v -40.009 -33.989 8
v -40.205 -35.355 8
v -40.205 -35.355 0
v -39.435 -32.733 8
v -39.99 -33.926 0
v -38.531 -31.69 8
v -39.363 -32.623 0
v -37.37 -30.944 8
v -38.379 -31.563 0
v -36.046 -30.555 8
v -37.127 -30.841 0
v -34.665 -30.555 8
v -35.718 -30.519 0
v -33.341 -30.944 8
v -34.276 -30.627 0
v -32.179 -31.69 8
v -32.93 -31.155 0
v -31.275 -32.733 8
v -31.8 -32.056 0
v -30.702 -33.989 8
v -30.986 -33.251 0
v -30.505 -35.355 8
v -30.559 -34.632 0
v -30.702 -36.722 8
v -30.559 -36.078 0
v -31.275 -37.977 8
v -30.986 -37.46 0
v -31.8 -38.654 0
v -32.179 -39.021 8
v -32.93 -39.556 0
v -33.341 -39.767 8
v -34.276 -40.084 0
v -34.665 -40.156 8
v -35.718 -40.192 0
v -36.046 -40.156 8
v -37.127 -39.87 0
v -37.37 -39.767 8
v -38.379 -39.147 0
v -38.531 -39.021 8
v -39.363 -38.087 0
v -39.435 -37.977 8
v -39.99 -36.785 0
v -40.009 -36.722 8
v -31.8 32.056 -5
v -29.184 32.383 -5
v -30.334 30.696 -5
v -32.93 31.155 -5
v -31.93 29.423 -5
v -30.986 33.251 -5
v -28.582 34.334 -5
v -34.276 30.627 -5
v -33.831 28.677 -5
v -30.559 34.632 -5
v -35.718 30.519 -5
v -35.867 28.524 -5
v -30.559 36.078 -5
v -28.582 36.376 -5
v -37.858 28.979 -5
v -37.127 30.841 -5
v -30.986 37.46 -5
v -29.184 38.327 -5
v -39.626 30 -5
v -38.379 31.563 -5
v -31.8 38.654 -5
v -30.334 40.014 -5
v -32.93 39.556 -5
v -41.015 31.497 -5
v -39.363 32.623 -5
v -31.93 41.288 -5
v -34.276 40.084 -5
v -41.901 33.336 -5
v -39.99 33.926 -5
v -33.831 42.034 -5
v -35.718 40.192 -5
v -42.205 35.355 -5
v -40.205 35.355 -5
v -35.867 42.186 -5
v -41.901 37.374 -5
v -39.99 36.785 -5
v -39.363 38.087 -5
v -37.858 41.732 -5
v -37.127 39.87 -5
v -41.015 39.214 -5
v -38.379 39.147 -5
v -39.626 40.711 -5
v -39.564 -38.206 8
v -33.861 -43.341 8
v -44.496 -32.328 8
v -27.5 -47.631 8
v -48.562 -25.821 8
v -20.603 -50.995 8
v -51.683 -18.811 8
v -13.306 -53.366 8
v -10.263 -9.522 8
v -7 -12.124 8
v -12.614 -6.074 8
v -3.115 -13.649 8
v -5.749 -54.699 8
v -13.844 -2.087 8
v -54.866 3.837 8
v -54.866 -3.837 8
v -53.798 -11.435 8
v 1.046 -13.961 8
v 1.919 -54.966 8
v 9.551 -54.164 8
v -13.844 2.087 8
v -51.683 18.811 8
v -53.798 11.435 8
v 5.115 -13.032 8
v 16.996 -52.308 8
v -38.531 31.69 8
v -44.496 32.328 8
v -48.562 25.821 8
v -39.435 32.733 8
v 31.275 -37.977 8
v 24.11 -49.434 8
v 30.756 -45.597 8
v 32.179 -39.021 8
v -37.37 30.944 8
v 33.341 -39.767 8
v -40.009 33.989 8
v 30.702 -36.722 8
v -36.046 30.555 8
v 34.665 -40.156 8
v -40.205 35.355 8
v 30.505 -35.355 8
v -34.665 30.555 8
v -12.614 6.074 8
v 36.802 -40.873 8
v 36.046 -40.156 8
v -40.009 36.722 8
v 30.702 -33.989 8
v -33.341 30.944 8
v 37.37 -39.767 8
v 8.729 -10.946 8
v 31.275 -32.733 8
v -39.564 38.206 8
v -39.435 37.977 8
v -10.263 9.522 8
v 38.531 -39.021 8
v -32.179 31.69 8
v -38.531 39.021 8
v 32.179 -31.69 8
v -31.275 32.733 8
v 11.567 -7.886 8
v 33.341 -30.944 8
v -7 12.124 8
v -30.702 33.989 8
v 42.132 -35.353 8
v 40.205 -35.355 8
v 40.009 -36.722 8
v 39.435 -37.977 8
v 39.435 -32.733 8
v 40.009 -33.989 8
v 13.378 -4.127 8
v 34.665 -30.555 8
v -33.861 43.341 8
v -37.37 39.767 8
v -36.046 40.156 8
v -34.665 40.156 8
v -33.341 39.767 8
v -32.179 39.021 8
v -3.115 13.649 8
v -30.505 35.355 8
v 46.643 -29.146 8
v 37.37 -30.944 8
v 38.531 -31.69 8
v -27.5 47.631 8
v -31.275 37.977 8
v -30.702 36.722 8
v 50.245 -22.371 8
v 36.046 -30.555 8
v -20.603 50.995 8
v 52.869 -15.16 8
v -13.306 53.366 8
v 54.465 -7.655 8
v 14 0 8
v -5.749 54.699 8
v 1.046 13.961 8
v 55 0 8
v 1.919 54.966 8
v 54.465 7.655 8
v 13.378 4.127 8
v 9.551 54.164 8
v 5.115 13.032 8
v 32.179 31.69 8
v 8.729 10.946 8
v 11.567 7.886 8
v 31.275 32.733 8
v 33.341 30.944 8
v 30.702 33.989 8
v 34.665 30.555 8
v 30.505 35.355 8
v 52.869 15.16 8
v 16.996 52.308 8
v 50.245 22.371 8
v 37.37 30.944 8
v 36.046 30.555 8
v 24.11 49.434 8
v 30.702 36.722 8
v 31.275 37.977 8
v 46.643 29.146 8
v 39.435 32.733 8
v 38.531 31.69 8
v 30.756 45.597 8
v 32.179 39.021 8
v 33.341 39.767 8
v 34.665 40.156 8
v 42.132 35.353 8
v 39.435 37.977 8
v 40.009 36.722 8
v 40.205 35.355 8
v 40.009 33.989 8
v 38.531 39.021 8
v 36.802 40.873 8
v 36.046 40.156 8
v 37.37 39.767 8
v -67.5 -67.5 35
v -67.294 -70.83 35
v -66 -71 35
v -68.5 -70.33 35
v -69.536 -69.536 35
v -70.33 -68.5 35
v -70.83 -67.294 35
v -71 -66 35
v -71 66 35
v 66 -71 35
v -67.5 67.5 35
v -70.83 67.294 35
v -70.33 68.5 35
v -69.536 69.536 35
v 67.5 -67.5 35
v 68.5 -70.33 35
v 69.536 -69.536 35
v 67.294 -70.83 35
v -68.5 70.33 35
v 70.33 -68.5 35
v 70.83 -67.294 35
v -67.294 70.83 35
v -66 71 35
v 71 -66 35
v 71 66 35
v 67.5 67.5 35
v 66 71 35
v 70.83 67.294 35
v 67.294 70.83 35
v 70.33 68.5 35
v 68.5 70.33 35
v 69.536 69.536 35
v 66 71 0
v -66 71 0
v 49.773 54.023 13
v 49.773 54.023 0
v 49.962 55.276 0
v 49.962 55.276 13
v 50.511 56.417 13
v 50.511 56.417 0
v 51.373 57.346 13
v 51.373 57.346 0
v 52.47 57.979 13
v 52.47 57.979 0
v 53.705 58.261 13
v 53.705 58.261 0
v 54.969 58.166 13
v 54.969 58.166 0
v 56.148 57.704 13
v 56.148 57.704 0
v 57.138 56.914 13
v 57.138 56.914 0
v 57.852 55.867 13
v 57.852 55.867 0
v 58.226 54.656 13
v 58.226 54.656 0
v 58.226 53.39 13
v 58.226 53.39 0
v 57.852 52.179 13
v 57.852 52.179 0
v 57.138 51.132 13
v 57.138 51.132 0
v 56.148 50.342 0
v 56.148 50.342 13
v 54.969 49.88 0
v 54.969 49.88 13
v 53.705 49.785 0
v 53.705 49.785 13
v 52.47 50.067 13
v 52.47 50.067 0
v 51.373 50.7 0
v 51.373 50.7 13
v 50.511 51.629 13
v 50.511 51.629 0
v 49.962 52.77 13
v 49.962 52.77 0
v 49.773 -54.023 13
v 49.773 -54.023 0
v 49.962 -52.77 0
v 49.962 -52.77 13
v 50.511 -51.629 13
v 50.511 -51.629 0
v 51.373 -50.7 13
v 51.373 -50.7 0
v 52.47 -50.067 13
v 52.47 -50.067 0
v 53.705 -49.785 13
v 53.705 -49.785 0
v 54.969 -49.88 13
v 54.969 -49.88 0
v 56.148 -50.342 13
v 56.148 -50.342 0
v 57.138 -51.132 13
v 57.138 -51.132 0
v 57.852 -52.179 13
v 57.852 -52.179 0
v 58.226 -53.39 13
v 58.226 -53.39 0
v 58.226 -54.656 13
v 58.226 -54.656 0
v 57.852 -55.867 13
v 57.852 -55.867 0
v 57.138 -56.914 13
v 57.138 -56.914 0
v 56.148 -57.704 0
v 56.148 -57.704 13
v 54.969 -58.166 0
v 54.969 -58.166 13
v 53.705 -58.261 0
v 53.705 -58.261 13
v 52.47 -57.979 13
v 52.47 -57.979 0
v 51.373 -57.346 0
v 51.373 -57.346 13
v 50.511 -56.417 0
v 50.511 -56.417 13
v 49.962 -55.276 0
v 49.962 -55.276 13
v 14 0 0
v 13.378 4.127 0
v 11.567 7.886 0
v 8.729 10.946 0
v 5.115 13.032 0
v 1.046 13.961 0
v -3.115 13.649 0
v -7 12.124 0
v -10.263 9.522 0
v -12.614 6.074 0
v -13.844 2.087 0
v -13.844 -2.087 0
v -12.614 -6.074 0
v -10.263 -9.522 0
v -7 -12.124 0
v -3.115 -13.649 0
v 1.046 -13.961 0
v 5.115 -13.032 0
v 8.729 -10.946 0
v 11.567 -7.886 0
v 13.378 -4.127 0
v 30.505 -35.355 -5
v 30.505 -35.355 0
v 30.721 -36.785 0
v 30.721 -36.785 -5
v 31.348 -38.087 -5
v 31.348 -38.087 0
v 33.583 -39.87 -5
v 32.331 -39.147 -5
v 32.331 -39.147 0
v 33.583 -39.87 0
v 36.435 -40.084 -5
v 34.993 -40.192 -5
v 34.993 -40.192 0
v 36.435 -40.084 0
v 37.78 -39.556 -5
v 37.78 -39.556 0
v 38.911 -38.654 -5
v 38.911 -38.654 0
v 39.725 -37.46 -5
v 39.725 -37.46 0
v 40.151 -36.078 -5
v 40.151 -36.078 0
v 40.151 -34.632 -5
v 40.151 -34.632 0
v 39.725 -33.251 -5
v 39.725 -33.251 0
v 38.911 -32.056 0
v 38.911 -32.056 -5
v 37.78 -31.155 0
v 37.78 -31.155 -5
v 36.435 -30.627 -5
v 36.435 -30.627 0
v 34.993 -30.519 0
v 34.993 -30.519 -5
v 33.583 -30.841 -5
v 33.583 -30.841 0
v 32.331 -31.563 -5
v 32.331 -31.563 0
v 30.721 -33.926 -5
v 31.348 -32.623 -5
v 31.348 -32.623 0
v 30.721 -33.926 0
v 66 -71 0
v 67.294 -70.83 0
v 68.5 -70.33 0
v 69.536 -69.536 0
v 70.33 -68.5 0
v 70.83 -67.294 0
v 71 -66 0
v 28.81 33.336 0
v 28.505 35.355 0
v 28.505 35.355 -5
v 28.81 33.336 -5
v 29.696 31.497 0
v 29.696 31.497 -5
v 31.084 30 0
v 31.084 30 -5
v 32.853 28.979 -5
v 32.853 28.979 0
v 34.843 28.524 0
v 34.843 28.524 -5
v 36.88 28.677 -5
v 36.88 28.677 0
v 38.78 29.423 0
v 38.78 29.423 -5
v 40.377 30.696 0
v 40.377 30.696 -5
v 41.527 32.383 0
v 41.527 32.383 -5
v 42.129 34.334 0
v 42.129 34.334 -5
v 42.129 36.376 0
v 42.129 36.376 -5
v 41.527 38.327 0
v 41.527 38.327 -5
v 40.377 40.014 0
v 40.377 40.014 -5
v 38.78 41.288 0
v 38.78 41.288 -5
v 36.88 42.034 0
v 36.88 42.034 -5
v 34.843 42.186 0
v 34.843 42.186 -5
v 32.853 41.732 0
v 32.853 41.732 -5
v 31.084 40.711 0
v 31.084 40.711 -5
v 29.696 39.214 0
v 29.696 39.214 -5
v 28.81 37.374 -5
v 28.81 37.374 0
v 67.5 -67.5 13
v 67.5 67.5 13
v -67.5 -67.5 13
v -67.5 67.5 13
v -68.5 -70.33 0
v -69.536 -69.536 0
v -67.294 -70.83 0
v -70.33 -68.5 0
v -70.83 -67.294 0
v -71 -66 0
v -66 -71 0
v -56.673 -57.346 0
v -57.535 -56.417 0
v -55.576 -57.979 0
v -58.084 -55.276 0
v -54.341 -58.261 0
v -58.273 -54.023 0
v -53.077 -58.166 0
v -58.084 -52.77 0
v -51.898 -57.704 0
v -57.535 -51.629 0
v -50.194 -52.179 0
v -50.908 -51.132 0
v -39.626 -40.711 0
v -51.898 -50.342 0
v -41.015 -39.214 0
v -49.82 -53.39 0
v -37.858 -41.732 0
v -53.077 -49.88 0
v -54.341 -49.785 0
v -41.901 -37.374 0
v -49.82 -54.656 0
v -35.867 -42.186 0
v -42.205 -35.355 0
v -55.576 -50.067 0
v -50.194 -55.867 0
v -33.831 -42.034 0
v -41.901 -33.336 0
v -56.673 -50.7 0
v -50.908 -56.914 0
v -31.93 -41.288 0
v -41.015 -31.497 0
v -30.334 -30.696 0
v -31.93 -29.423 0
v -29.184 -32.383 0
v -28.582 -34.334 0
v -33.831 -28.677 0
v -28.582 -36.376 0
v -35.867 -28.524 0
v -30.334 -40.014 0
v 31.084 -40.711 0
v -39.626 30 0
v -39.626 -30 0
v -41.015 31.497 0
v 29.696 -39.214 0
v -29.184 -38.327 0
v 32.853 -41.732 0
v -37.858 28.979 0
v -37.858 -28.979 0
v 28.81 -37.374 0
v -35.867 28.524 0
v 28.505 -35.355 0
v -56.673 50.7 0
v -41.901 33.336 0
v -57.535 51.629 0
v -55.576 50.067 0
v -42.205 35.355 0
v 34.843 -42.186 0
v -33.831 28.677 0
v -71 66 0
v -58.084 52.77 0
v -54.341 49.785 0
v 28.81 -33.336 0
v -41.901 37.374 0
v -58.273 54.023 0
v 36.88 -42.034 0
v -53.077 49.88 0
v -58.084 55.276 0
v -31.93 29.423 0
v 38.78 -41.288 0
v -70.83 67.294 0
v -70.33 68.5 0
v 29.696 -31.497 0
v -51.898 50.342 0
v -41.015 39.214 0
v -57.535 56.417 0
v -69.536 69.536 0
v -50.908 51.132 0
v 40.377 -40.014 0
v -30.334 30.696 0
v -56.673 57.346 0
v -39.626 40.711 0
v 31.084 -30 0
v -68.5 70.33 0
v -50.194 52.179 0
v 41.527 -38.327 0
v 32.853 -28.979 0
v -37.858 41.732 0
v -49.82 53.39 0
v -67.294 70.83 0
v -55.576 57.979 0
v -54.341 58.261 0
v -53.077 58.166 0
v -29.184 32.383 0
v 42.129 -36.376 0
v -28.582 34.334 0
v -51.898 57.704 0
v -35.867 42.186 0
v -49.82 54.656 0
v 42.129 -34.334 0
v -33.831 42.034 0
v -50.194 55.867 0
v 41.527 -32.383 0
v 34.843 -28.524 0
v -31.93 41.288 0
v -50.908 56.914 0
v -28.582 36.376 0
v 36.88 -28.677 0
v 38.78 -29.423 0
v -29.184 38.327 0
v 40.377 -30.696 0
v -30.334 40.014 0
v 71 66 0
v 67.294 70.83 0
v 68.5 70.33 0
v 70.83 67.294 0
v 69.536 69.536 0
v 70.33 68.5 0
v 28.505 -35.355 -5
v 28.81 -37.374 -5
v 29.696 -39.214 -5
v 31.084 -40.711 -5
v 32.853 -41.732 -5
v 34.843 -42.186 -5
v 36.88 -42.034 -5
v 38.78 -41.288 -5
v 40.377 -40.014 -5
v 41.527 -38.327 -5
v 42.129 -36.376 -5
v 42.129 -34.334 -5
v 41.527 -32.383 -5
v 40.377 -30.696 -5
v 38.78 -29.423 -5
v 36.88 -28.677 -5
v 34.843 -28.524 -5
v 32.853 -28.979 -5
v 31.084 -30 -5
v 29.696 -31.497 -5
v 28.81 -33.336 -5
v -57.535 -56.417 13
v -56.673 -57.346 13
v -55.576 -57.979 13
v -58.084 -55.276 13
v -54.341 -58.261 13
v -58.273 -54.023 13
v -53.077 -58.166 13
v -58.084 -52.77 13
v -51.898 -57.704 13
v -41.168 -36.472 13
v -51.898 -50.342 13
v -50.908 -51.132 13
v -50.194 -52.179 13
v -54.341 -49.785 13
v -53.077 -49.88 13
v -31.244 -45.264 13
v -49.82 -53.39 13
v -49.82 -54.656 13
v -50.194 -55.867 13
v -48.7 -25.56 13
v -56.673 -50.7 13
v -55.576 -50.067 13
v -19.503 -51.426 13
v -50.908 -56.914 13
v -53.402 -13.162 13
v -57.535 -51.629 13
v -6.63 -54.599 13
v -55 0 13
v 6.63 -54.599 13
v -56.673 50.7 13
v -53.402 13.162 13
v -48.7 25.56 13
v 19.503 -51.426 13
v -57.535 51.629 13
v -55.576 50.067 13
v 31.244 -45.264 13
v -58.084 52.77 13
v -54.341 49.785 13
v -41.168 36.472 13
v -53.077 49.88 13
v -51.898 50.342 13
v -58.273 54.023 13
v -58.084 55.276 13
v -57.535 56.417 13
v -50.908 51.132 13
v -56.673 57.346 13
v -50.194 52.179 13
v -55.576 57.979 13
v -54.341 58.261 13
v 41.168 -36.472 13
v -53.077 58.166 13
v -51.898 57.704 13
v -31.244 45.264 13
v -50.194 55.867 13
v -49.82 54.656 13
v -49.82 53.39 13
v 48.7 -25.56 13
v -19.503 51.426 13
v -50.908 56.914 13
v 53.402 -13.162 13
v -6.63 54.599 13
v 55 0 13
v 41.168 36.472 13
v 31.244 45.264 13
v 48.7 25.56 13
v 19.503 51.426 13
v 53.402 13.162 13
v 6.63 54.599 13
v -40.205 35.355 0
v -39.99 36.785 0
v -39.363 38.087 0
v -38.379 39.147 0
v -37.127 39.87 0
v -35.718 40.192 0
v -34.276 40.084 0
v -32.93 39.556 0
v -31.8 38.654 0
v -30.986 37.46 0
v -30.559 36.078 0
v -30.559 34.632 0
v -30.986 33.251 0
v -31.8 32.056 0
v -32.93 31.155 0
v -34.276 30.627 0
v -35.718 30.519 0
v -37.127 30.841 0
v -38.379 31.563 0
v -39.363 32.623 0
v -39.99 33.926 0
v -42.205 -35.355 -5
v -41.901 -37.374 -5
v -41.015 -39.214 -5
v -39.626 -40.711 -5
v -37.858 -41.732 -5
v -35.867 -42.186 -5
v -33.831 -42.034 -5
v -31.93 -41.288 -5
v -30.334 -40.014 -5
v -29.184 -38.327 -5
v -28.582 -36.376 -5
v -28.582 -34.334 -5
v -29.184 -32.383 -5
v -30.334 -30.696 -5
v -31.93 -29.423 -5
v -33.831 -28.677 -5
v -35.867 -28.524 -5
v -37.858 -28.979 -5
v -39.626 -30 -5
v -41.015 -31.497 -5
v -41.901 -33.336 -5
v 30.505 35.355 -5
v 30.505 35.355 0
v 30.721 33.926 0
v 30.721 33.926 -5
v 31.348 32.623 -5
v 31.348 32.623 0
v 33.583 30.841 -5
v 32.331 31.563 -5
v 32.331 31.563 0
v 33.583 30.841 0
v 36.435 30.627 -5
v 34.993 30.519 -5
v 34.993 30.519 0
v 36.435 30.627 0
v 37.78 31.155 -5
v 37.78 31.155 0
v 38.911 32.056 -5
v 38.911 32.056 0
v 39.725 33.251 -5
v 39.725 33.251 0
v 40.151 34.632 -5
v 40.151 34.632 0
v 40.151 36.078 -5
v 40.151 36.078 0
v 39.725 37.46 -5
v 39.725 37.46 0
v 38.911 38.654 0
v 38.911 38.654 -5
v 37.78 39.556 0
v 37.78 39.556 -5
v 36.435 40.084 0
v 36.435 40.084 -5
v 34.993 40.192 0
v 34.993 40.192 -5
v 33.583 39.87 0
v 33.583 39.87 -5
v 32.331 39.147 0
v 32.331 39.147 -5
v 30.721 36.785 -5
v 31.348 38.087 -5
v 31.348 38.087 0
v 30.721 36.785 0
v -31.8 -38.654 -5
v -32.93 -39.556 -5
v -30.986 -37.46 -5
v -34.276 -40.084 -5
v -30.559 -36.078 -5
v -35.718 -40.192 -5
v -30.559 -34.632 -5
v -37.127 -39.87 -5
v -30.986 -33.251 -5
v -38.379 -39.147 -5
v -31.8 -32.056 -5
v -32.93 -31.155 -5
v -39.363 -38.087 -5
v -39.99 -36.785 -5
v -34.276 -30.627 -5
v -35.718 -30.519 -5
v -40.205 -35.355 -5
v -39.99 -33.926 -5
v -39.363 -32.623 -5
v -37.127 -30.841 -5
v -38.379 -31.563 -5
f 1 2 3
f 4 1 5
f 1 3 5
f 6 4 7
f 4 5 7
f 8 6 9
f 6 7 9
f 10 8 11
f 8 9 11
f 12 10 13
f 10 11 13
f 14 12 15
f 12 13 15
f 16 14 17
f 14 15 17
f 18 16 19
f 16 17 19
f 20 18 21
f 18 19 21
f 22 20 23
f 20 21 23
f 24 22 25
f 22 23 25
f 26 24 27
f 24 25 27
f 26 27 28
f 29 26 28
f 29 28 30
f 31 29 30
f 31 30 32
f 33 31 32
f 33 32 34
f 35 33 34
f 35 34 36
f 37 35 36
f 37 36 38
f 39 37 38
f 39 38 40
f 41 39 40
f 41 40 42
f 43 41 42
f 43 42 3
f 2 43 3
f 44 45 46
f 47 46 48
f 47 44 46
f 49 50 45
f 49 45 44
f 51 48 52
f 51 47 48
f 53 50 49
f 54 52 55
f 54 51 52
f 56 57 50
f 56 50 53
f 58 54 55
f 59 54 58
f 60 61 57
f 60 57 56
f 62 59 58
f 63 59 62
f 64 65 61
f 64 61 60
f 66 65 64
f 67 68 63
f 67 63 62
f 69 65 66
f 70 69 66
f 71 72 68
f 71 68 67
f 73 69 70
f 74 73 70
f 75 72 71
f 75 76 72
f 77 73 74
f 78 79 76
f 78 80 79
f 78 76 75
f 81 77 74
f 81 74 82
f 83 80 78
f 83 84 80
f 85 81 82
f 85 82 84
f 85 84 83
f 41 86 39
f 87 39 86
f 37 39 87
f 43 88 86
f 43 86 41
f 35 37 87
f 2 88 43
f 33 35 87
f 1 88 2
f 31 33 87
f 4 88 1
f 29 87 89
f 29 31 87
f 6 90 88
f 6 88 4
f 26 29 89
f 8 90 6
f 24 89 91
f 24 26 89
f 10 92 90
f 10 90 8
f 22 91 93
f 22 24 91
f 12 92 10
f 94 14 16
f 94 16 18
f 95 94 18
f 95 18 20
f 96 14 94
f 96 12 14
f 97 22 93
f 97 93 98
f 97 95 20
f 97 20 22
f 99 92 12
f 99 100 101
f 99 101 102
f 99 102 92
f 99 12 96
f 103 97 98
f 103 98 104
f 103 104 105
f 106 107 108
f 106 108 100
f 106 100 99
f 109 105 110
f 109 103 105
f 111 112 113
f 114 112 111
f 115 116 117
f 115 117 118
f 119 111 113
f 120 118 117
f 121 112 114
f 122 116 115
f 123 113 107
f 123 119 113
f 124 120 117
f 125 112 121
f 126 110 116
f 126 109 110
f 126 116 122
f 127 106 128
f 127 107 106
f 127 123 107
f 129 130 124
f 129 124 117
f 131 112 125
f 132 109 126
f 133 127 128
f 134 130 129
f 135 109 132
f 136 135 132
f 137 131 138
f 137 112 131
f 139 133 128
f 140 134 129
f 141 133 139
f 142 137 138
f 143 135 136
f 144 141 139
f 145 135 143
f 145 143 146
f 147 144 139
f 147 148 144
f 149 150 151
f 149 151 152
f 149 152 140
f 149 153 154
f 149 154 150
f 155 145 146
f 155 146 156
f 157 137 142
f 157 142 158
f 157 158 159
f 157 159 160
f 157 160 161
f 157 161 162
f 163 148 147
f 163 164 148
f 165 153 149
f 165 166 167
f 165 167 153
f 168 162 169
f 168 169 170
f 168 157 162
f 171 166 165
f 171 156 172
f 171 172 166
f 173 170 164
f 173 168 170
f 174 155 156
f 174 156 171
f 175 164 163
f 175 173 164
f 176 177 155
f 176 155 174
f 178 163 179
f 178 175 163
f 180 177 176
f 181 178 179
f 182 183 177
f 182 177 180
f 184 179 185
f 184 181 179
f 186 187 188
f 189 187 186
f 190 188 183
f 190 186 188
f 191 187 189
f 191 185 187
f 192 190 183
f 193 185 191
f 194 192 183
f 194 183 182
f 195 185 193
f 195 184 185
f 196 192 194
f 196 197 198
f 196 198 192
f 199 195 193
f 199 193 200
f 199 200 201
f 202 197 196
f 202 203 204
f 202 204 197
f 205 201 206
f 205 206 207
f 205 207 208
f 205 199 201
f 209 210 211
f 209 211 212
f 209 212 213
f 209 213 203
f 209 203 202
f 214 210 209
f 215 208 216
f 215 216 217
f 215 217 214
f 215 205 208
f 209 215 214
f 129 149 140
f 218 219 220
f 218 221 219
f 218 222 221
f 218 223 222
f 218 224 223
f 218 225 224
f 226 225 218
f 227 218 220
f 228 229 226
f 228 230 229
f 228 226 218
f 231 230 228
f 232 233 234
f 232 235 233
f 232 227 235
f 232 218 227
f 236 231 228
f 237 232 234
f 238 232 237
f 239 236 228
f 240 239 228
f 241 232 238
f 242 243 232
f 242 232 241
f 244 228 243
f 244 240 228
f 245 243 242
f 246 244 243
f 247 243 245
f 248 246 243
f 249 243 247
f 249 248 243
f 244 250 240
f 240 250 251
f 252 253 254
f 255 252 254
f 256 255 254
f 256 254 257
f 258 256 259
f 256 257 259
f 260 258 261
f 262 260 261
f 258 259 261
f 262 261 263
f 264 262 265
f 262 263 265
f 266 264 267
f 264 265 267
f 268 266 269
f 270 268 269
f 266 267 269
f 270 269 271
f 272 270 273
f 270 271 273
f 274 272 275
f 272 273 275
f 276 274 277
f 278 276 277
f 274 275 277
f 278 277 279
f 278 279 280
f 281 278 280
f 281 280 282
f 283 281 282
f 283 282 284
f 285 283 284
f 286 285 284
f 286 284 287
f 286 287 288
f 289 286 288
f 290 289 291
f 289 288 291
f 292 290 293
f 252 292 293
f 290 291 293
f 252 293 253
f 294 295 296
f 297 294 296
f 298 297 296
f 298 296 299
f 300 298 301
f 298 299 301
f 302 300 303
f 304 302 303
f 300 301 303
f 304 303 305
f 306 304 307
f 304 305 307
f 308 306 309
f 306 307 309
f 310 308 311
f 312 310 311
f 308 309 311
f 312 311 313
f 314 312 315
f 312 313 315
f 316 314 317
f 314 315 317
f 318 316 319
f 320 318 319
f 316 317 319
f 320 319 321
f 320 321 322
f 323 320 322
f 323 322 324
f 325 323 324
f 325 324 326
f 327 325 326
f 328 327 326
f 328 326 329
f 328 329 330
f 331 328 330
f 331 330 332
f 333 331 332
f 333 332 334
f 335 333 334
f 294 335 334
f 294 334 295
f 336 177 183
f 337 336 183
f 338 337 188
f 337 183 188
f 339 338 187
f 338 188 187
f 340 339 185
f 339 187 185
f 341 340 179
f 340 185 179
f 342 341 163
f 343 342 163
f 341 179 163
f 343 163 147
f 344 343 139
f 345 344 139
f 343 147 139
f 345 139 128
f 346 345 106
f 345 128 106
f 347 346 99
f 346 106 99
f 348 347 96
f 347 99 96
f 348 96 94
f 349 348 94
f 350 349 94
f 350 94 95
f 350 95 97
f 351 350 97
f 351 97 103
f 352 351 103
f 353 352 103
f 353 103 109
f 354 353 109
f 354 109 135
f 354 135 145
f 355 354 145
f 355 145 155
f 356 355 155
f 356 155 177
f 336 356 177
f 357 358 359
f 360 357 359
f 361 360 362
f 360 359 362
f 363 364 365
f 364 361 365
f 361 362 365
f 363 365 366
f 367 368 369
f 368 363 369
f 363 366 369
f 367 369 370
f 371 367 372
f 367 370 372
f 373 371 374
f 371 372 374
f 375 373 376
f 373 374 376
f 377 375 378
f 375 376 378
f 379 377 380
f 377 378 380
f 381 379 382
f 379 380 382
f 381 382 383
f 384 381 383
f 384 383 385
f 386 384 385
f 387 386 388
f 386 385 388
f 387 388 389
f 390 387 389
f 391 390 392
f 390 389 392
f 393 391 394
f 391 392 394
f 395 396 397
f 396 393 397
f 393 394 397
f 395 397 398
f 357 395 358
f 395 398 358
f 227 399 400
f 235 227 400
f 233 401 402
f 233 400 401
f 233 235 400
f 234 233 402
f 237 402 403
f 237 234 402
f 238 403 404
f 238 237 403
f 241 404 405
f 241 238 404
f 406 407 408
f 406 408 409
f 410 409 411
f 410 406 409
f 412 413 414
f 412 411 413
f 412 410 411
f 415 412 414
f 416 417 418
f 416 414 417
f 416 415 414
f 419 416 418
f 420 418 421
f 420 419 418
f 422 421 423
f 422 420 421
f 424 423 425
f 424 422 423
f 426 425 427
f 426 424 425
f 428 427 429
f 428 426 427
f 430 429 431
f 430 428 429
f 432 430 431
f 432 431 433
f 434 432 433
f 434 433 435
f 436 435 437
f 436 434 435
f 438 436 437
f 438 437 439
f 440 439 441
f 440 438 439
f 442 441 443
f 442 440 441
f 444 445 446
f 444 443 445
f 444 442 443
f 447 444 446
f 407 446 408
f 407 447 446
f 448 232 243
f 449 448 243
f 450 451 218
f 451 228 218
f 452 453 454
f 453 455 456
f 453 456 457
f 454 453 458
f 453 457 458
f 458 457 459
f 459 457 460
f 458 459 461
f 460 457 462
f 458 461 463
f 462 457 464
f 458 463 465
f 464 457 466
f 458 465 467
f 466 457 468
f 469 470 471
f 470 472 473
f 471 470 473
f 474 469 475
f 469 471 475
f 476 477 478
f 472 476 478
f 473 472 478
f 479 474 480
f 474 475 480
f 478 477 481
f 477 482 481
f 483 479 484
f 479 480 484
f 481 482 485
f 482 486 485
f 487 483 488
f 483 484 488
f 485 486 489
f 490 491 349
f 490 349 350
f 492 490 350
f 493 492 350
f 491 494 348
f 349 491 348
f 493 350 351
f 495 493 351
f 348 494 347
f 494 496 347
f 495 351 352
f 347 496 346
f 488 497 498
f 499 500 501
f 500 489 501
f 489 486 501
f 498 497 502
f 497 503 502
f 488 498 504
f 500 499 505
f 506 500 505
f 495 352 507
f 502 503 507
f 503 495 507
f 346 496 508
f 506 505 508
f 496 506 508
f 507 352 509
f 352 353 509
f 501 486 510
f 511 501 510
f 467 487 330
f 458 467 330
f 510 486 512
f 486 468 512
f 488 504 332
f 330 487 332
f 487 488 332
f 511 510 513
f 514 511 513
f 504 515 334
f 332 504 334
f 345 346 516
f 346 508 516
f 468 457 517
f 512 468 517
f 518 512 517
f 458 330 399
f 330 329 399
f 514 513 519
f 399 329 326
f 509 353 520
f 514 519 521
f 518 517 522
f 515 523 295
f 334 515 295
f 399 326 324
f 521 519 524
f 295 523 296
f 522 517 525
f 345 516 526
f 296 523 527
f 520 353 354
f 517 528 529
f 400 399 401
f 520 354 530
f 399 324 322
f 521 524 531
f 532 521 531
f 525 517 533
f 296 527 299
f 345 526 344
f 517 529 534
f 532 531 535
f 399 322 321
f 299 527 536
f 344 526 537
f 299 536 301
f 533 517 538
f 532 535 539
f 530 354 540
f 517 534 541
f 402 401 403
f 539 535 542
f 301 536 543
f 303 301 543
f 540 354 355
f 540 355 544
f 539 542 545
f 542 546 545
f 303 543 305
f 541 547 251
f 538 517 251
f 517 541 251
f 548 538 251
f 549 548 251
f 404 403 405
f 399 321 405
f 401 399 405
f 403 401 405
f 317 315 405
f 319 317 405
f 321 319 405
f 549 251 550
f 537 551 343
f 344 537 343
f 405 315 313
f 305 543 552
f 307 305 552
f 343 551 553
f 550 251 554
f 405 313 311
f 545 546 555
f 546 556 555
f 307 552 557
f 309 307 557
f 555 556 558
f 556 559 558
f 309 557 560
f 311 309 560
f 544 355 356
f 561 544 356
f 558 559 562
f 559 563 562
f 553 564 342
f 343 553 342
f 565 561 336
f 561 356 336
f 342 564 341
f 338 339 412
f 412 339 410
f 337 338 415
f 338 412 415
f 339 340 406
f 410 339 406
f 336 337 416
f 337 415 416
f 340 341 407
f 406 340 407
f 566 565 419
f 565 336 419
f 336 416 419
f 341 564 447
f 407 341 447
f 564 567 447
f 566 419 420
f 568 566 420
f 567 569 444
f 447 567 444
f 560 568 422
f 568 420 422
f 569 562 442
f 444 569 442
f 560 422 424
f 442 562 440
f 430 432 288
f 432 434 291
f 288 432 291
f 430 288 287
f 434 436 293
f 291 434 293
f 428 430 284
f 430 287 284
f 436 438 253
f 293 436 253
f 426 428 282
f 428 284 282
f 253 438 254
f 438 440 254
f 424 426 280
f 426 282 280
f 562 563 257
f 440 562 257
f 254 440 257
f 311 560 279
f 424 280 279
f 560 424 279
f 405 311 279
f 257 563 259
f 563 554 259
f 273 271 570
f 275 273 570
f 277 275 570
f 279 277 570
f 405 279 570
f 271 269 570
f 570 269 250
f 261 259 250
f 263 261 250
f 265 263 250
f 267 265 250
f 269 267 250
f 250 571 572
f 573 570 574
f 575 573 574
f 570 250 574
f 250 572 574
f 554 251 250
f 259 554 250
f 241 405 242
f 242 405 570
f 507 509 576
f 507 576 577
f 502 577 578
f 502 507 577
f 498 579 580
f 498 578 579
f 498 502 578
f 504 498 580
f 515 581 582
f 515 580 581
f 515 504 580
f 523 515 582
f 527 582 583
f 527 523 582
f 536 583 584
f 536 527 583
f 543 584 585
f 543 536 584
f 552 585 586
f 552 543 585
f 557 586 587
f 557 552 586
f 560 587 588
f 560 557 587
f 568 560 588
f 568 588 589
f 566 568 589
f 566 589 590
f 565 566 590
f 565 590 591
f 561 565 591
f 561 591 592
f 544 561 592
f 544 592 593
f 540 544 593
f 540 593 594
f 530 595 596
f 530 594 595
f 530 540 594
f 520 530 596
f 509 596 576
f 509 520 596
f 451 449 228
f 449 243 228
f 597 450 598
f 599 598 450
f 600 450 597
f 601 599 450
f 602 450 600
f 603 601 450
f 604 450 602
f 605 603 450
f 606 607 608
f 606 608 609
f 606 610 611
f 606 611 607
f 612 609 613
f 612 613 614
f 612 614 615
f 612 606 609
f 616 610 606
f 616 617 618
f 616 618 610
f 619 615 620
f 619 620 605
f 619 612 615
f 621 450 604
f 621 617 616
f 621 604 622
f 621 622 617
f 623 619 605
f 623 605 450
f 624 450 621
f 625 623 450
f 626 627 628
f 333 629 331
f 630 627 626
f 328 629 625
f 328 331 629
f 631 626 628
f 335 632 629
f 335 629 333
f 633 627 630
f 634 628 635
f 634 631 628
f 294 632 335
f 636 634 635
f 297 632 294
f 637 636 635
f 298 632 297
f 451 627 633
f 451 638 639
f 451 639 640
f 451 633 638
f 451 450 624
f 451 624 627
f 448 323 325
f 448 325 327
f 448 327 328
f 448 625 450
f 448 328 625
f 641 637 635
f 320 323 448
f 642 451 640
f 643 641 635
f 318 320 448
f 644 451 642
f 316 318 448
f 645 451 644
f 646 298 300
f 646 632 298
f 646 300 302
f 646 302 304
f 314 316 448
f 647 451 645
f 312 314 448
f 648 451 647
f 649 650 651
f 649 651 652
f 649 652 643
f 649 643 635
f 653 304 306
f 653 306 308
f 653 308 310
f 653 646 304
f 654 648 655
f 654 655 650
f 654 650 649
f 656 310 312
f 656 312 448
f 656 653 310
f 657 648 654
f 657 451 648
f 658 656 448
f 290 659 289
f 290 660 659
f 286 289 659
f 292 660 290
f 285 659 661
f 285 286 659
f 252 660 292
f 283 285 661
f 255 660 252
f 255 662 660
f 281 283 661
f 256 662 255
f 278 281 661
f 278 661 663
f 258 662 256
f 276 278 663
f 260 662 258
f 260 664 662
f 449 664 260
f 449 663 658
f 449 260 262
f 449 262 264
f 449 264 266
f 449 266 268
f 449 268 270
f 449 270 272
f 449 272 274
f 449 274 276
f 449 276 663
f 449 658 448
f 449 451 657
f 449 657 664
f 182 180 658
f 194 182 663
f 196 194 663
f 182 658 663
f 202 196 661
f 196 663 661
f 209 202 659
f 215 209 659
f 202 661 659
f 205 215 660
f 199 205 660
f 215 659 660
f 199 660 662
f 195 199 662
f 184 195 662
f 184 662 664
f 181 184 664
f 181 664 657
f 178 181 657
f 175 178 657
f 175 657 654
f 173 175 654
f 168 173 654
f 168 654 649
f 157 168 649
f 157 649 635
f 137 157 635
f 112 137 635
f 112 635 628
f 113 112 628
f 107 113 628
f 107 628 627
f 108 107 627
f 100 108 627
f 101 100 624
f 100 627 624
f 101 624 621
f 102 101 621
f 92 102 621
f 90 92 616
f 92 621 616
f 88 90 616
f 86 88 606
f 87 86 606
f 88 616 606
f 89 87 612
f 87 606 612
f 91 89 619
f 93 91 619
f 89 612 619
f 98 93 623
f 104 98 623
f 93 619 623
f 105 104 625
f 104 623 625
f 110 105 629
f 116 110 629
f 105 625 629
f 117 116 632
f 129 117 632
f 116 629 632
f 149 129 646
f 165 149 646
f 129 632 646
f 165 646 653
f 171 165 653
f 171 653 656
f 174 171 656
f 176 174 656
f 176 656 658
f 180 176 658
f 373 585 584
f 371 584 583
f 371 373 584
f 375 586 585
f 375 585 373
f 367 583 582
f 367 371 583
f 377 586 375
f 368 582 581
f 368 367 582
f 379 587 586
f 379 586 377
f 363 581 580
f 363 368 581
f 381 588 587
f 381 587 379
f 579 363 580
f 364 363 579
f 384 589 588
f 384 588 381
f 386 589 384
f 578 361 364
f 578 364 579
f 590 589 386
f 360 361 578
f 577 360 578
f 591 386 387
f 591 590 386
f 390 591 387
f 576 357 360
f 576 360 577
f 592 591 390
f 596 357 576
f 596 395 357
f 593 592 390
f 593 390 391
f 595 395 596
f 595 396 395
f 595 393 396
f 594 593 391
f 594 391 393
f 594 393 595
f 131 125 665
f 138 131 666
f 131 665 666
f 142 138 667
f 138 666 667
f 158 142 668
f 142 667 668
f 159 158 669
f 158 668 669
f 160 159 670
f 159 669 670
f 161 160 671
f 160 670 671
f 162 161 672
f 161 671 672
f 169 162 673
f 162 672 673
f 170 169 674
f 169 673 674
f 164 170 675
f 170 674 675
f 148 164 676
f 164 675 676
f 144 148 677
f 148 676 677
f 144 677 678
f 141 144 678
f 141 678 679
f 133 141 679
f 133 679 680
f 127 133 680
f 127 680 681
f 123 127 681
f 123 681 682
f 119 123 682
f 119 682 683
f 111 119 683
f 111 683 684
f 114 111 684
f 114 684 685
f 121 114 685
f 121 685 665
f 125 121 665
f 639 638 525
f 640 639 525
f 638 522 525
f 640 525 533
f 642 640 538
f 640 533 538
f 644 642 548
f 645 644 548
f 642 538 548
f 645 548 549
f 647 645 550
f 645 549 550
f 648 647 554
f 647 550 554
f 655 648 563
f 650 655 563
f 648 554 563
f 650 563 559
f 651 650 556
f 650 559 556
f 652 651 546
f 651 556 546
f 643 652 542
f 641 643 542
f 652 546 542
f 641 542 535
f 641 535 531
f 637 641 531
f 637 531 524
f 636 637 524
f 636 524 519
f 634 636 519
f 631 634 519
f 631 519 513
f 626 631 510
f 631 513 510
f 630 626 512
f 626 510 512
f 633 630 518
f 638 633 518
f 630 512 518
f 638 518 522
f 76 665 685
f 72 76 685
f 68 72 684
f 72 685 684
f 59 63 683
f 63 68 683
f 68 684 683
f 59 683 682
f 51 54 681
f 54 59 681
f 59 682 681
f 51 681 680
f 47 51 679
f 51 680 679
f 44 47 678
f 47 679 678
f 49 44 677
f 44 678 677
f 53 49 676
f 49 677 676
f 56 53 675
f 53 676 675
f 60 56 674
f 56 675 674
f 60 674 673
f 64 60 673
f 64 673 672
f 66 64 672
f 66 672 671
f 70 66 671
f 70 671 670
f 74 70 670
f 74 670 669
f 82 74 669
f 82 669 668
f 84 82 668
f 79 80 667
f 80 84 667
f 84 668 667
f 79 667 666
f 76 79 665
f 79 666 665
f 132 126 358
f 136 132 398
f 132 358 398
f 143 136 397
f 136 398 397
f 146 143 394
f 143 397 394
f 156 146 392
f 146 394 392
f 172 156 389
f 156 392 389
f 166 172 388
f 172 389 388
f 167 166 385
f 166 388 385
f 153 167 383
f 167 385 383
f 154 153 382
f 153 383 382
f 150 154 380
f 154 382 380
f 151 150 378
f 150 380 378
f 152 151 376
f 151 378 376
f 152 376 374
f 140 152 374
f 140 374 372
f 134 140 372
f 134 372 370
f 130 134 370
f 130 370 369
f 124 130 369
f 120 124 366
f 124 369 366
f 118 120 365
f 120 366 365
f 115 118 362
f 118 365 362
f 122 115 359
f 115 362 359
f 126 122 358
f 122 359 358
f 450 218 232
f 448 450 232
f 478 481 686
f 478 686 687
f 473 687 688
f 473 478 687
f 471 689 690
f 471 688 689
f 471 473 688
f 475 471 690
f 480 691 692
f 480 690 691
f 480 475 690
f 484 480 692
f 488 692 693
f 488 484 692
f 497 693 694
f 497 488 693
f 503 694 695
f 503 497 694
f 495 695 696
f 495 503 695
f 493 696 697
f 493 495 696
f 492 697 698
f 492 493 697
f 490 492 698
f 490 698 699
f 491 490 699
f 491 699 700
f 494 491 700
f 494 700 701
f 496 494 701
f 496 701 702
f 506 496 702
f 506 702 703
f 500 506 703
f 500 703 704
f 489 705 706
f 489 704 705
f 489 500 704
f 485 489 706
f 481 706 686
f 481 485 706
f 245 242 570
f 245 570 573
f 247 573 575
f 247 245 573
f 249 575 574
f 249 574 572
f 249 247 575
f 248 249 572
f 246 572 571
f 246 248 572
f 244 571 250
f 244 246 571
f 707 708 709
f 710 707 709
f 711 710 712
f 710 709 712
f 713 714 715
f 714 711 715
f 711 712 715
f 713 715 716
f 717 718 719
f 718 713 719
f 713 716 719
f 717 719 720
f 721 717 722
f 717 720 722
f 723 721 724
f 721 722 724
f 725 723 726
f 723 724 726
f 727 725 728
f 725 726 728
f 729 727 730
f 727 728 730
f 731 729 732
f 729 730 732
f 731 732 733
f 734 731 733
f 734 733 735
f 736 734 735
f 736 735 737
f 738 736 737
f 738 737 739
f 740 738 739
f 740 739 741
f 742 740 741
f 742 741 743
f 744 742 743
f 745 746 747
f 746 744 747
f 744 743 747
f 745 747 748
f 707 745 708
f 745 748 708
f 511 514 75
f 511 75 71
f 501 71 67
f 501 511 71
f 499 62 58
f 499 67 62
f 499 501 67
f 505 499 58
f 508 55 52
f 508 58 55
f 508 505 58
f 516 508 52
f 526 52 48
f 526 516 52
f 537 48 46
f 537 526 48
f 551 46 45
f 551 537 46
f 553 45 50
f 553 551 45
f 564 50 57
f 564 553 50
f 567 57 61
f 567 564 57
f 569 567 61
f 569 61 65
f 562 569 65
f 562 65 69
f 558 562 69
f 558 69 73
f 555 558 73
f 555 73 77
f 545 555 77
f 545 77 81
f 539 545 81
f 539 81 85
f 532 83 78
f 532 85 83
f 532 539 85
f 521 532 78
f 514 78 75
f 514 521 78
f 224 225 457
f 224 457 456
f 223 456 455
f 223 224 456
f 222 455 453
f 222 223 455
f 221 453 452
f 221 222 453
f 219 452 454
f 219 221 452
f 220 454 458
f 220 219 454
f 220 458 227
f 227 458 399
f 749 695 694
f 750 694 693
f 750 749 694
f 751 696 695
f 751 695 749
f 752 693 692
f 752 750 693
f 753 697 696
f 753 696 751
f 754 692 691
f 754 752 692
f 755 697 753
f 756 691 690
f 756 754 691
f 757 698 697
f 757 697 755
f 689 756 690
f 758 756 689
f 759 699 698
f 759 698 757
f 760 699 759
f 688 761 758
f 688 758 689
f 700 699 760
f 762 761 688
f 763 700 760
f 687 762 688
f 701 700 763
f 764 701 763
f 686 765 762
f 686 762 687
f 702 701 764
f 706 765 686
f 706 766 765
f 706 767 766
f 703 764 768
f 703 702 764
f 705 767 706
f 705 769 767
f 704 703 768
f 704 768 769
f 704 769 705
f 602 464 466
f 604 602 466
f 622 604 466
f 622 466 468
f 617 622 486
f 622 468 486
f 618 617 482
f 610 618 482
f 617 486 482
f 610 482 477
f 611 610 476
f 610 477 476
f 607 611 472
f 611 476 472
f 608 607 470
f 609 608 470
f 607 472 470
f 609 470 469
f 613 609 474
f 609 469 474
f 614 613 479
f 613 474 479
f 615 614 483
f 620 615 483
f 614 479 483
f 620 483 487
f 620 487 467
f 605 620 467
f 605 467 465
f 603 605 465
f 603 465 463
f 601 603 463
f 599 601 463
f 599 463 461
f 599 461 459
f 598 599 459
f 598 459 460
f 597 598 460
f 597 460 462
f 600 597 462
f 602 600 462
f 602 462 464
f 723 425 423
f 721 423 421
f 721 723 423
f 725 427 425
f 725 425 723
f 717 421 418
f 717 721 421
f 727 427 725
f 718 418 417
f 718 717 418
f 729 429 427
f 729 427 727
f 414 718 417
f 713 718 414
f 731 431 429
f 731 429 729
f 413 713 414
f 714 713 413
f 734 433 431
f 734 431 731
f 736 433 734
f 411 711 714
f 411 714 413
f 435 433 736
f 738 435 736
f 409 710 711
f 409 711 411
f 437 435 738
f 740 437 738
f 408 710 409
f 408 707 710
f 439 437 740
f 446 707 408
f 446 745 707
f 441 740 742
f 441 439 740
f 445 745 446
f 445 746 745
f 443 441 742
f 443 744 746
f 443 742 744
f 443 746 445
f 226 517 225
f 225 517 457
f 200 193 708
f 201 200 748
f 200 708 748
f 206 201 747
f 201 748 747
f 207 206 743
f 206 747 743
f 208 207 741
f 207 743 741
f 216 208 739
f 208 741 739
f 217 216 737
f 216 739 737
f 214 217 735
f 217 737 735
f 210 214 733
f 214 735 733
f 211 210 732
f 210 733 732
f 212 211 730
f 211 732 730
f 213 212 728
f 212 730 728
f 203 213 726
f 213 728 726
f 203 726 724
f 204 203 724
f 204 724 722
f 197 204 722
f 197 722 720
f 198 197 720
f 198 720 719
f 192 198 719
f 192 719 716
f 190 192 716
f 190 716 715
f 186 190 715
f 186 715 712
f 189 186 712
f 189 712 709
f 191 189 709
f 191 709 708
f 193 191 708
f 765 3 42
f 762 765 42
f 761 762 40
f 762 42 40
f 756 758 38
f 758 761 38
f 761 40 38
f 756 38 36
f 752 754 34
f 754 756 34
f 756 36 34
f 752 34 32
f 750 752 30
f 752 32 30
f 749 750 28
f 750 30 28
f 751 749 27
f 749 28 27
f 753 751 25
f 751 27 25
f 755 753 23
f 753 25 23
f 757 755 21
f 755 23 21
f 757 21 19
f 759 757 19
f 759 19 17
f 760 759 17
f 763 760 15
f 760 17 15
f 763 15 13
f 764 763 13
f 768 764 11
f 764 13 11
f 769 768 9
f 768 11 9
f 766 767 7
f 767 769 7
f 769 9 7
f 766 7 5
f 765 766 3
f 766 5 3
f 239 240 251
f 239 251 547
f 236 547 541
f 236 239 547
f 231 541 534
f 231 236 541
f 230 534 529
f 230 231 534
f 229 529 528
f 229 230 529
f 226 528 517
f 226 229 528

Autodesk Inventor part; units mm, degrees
ref_plane "YZ Plane" through (0, 0, 0) normal (1, 0, 0) x (0, 1, 0)
ref_plane "XZ Plane" through (0, 0, 0) normal (0, 1, 0) x (-1, 0, 0)
ref_plane "XY Plane" through (0, 0, 0) normal (0, 0, 1) x (1, 0, 0)
sketch "Sketch1" plane through (0, 0, 0) normal (0, 0, 1) x (1, 0, 0)
  line L0 (71, 71) -> (-71, 71)
  line L1 (-71, 71) -> (-71, -71)
  line L2 (-71, -71) -> (71, -71)
  line L3 (71, -71) -> (71, 71)
  point P0 (0, 0)
extrude "Extrusion1" add sketch "Sketch1" along normal blind 35
fillet "Fillet1" radius 5 4 edges at (-71, -71, 17.5) (-71, 71, 17.5) (71, 71, 17.5) (71, -71, 17.5)
sketch "Sketch6" plane through (0, 0, 35) normal (0, 0, 1) x (1, 0, 0)
  line L0 (-67.5, -67.5) -> (67.5, -67.5)
  line L1 (67.5, -67.5) -> (67.5, 67.5)
  line L2 (67.5, 67.5) -> (-67.5, 67.5)
  line L3 (-67.5, 67.5) -> (-67.5, -67.5)
  line L4 (-67.5, -67.5) -> (67.5, 67.5) construction
  line L5 (67.5, -67.5) -> (-67.5, 67.5) construction
  point P0 (0, 0)
  dimension "d26" = 135
  dimension "d27" = 135
extrude "Extrusion6" cut sketch "Sketch6" against normal blind 22
sketch "Sketch7" plane through (0, 0, 13) normal (0, 0, 1) x (1, 0, 0)
  point P0 (0, 0)
sketch "Sketch8" plane through (0, 0, 13) normal (0, 0, 1) x (1, 0, 0)
  circle A0 centre (0, 0) radius 55
  dimension "d30" = 110
extrude "Extrusion7" cut sketch "Sketch8" against normal blind 5
sketch "Sketch9" plane through (0, 0, 8) normal (0, 0, 1) x (1, 0, 0)
  circle A0 centre (0, 0) radius 14
  dimension "d33" = 28
extrude "Extrusion8" cut sketch "Sketch9" against normal through all
sketch "Sketch10" plane through (0, 0, 0) normal (0, 0, -1) x (-1, 0, 0)
  circle A0 centre (0, 0) radius 76.4 construction
  line L0 (0, 0) -> (54.023, -54.023) construction
  line L1 (0, 0) -> (76.4, 0) construction
  line L2 (0, 0) -> (0, -71) construction
  line L3 (66, -71) -> (-66, -71) projected
  line L4 (0, 0) -> (-76.4, 0) construction
  line L5 (-67.5, 67.5) -> (-67.5, -67.5) projected
  circle A1 centre (54.023, -54.023) radius 4.25
  circle A2 centre (-54.023, -54.023) radius 4.25
  circle A3 centre (54.023, 54.023) radius 4.25
  circle A4 centre (-54.023, 54.023) radius 4.25
  circle A5 centre (0, 0) radius 50 construction
  circle A6 centre (35.3553, -35.3553) radius 4.85
  circle A7 centre (-35.3553, -35.3553) radius 4.85
  circle A8 centre (35.3553, 35.3553) radius 4.85
  circle A9 centre (-35.3553, 35.3553) radius 4.85
  dimension "d41" = 100
  dimension "d36" = 152.8
  dimension "d37" = 45
  dimension "d38" = 8.5
  dimension "d42" = 9.7
extrude "Extrusion9" cut sketch "Sketch10" against normal through all
sketch "Sketch12" plane through (0, 0, 0) normal (0, 0, -1) x (-1, 0, 0)
  circle A0 centre (35.3553, -35.3553) radius 4.85 projected
  circle A1 centre (35.3553, 35.3553) radius 4.85 projected
  circle A2 centre (-35.3553, 35.3553) radius 4.85 projected
  circle A3 centre (-35.3553, -35.3553) radius 4.85 projected
  circle A4 centre (35.3553, -35.3553) radius 6.85
  circle A5 centre (-35.3553, -35.3553) radius 6.85
  circle A6 centre (-35.3553, 35.3553) radius 6.85
  circle A7 centre (35.3553, 35.3553) radius 6.85
  point P0 (0, 0)
extrude "Extrusion10" add sketch "Sketch12" along normal blind 5
properties part number "GEARBOX-SUPPORT" material "PET Plastic"
